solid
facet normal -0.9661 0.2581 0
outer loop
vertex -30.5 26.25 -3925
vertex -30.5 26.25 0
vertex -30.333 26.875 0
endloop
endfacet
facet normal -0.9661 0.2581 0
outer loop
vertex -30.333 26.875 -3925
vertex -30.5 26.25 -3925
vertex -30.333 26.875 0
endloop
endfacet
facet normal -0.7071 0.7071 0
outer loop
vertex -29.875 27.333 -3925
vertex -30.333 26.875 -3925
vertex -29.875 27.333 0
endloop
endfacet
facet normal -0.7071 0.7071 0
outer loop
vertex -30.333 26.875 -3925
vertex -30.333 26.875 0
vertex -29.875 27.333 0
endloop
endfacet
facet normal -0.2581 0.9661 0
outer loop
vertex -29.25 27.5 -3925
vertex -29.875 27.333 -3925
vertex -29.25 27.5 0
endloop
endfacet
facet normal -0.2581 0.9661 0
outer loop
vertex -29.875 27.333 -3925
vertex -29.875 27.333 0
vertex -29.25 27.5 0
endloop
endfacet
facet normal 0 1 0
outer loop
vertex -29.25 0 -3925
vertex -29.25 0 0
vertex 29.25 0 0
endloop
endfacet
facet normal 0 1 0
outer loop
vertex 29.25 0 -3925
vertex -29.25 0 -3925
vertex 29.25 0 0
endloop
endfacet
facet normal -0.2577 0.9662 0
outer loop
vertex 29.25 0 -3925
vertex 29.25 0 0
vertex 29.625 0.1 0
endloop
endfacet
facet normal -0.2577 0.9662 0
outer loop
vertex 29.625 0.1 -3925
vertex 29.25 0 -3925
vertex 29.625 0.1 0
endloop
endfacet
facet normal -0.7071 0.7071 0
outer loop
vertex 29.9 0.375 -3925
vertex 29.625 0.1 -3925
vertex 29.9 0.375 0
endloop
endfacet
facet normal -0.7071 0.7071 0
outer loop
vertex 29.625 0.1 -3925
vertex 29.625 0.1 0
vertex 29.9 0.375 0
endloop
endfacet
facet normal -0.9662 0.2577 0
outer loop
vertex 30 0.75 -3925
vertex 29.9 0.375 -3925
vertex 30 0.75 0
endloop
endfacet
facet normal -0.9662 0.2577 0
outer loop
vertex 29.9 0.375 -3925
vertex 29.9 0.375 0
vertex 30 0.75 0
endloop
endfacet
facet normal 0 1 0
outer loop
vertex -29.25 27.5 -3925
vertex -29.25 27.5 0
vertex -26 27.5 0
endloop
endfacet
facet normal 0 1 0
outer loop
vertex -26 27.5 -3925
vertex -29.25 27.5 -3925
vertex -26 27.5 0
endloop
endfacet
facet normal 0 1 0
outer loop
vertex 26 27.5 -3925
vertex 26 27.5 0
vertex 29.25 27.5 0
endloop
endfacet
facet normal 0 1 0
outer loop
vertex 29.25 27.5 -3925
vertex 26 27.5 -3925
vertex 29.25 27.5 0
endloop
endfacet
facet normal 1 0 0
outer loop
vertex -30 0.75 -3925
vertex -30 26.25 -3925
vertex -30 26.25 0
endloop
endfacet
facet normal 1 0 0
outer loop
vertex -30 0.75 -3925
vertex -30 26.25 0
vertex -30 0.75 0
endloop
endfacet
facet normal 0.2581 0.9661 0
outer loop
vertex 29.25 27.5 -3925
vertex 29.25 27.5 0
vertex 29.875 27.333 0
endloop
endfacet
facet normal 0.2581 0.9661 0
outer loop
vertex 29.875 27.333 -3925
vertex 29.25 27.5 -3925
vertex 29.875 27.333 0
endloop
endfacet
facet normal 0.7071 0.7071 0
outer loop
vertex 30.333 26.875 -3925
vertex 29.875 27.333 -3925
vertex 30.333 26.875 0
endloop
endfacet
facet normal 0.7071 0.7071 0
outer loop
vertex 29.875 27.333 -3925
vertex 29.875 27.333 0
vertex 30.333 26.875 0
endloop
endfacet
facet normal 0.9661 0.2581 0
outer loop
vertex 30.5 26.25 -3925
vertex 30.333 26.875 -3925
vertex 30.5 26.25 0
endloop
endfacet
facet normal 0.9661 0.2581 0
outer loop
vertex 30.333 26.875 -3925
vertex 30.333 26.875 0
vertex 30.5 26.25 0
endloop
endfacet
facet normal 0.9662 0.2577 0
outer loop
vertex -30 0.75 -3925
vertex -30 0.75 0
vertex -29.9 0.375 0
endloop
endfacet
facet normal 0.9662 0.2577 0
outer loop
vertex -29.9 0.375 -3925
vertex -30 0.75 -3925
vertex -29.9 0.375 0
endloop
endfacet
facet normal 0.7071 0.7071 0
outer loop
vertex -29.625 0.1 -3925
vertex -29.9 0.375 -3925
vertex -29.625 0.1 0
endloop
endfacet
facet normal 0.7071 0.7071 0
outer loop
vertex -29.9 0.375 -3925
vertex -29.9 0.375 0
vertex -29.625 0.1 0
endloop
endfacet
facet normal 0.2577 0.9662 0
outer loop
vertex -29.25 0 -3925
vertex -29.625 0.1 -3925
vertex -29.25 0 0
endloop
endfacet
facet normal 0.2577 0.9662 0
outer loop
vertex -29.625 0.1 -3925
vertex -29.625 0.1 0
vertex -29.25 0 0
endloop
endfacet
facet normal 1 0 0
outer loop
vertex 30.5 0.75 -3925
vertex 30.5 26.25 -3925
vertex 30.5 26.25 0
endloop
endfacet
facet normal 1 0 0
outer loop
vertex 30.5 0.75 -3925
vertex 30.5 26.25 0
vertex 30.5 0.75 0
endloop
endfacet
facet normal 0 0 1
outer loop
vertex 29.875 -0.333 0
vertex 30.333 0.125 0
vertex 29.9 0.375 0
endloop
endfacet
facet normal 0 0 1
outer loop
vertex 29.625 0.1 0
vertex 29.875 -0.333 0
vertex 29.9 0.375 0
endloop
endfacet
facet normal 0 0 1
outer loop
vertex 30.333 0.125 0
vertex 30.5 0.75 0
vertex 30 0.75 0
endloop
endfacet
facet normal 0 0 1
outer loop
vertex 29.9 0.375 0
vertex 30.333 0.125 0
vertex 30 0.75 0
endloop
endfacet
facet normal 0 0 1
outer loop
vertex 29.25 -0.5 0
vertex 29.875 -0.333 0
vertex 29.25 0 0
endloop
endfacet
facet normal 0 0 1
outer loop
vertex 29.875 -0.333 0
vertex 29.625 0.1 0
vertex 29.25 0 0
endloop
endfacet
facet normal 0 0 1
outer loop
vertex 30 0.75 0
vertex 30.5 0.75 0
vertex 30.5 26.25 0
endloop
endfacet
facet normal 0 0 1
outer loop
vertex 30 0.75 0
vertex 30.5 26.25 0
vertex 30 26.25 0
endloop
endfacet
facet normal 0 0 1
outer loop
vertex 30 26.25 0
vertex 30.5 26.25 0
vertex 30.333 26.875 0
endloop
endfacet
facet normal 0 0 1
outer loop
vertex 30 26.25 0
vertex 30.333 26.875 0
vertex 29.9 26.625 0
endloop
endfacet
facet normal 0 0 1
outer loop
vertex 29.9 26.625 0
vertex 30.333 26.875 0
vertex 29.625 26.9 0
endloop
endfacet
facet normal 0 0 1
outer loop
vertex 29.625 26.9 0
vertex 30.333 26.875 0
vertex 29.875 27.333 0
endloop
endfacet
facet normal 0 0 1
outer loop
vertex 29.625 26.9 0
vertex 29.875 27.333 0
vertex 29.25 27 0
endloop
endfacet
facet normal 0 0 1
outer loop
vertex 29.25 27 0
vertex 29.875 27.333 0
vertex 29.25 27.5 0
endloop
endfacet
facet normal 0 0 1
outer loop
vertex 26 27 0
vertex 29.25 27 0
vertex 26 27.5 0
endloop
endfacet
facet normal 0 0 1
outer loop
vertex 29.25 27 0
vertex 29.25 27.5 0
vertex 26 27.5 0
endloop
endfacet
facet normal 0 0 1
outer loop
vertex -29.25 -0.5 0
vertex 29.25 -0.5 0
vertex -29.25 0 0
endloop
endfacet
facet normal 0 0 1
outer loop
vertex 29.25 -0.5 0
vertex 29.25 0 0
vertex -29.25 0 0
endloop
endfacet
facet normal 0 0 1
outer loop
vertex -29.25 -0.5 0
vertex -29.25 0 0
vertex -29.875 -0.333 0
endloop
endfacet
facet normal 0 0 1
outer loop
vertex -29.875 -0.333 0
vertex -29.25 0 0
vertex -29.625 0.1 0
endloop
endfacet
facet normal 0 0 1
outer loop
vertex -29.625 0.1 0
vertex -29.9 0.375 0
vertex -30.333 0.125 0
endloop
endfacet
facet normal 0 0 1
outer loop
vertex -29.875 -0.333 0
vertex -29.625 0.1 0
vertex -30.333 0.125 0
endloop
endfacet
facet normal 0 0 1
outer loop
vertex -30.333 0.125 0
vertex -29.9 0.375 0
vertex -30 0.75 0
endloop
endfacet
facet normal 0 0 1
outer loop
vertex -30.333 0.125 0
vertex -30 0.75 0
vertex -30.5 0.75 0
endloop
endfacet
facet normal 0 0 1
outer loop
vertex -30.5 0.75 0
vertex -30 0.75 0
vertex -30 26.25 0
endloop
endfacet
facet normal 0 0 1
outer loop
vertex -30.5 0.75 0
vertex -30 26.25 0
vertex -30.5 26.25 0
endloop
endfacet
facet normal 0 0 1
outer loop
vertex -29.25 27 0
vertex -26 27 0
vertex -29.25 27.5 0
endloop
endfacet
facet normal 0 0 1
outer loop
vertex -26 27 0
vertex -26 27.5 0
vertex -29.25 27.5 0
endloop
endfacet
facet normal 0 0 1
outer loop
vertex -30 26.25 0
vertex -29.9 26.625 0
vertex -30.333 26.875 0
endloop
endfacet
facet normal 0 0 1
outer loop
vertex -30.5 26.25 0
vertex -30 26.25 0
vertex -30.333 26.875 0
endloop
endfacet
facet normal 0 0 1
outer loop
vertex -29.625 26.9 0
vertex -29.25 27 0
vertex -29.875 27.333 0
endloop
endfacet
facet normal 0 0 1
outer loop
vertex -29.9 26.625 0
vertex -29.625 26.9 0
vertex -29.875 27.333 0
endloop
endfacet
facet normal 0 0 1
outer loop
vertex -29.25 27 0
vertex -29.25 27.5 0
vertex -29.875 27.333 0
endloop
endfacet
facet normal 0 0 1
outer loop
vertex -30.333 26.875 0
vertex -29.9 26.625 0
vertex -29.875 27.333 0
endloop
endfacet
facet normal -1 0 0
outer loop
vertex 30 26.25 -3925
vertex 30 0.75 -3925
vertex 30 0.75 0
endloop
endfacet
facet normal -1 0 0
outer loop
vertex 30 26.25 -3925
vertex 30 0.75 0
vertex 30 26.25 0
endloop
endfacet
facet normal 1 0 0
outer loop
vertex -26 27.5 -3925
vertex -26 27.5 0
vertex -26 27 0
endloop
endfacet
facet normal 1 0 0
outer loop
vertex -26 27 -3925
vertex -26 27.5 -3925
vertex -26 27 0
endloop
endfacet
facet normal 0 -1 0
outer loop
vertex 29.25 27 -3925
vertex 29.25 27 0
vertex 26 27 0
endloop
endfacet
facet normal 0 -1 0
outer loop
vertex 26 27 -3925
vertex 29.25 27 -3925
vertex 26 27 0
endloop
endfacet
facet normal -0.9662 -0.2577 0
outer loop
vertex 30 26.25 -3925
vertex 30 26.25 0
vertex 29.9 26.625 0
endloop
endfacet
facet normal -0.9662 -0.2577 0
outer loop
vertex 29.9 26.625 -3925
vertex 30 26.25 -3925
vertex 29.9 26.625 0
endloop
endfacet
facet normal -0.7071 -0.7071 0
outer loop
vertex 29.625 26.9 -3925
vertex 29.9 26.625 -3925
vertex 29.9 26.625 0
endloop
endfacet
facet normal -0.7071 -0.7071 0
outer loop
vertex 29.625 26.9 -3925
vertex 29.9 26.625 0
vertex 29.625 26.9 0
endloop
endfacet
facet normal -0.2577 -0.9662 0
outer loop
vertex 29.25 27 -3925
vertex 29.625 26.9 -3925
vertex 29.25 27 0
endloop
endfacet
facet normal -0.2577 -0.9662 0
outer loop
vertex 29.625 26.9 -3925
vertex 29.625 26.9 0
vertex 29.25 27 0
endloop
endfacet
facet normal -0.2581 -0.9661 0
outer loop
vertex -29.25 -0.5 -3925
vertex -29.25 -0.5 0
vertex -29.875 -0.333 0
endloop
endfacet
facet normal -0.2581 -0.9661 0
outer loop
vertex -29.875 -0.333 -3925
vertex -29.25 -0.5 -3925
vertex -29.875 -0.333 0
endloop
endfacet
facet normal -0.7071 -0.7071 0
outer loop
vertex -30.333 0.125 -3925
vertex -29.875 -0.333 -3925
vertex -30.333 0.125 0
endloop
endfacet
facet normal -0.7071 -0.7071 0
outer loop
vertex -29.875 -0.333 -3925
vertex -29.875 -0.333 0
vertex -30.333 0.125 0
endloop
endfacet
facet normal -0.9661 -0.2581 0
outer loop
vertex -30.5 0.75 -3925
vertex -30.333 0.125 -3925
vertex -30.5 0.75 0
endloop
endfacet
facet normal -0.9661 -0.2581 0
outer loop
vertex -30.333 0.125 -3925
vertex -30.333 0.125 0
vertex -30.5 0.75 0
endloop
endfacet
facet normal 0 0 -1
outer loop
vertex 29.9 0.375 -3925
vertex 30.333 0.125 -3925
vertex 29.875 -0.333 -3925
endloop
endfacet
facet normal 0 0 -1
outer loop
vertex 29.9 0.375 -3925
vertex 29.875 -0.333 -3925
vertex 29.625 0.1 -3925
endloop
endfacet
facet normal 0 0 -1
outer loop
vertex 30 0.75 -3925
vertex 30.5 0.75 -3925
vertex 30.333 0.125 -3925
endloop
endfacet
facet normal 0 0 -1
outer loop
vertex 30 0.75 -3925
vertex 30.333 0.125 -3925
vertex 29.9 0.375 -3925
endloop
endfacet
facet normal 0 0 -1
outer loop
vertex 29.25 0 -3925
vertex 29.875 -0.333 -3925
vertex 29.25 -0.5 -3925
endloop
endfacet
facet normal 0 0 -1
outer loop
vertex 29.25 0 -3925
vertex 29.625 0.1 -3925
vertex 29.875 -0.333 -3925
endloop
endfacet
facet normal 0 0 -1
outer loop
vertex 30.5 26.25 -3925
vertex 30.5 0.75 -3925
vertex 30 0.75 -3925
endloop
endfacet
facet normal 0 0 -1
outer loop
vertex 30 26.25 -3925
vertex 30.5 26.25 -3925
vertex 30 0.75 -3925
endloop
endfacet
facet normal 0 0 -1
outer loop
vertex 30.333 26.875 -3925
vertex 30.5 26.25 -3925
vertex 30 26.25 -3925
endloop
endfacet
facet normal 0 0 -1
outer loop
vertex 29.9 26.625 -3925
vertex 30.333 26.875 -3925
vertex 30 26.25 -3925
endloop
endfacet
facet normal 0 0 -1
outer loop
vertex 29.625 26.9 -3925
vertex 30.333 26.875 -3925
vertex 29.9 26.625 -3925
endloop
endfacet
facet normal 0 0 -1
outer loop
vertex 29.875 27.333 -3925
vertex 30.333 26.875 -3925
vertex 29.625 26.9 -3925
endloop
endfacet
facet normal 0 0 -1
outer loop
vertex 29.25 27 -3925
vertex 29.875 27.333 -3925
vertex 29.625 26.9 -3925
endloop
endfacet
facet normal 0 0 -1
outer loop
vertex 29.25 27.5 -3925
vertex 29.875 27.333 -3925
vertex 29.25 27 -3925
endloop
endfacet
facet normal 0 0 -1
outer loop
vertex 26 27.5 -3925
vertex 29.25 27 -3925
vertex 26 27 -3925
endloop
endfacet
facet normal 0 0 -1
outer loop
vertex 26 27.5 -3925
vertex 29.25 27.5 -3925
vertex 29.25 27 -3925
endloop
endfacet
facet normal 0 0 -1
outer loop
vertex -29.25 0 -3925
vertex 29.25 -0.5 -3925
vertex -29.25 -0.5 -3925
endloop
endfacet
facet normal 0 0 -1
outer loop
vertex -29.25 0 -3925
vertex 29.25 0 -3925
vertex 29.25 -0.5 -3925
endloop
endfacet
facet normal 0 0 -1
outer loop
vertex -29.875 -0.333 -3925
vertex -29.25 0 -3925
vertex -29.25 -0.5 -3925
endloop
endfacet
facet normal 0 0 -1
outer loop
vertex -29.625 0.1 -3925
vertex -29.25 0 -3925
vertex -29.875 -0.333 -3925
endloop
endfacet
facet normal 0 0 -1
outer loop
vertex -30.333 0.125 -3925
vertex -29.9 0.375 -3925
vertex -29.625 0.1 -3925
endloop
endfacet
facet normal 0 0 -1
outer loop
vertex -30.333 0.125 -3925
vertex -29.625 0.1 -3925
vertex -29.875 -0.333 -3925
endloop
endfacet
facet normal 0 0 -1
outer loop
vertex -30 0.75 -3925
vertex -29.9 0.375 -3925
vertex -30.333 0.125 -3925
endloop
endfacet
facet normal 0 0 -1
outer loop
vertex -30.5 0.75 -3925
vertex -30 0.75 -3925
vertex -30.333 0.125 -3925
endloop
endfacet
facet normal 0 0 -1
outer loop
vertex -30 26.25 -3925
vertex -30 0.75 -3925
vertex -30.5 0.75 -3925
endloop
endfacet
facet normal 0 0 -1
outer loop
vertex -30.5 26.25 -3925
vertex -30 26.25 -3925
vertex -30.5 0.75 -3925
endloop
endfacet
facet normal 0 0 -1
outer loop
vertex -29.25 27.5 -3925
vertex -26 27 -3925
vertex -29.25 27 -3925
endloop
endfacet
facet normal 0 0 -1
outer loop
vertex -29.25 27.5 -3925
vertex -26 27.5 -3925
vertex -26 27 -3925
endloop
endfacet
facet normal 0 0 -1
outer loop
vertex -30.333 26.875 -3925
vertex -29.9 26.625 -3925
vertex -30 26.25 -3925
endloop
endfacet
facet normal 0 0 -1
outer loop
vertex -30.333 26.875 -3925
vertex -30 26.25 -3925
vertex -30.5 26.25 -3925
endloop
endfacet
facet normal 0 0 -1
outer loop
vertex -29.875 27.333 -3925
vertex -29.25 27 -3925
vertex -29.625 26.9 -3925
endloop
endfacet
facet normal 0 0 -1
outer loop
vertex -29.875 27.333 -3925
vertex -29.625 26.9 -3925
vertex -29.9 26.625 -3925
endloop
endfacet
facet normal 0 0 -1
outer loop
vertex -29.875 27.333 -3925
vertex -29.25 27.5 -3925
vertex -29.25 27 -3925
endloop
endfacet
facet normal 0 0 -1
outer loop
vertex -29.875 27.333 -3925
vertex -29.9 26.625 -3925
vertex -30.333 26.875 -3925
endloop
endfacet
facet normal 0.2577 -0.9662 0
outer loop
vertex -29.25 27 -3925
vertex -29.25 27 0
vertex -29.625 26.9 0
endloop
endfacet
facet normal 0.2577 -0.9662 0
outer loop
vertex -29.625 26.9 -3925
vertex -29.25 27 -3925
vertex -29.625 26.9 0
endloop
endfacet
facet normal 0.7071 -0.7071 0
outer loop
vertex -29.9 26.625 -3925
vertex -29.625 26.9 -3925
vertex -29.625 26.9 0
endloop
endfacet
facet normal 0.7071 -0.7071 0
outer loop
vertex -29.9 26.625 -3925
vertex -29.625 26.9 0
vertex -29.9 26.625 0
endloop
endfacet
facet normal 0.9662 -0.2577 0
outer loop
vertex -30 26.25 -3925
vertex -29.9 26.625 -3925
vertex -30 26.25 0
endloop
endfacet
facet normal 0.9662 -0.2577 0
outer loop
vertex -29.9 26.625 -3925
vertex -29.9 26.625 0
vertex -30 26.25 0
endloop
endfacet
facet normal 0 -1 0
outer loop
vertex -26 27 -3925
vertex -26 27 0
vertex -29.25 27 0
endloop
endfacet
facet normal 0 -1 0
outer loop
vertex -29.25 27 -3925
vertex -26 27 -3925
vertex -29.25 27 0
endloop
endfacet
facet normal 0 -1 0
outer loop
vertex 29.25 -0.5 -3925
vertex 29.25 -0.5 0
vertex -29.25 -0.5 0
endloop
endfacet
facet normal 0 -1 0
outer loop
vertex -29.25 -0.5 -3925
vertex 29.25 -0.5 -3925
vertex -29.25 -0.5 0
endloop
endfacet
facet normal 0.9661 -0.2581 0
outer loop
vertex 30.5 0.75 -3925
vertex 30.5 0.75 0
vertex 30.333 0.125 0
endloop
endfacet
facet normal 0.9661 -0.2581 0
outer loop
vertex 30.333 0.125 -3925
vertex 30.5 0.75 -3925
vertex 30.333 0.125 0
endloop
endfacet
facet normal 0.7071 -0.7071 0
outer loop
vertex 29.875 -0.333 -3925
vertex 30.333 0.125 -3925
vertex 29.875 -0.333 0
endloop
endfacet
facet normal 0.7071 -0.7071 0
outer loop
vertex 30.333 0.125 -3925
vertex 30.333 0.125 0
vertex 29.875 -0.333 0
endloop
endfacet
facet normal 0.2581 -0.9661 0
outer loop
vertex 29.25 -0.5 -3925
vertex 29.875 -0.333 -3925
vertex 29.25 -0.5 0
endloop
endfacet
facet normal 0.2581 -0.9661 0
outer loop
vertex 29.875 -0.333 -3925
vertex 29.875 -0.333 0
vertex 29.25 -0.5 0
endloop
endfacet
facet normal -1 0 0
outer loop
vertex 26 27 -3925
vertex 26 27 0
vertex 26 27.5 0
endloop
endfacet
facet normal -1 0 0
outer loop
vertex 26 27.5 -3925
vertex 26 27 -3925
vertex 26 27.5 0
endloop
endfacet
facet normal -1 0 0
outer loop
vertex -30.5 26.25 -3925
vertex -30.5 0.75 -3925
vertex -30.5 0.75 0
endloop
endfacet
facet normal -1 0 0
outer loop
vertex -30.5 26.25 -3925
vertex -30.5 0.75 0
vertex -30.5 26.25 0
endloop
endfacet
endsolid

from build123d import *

# Parameters (mm, degrees)
SM_BASE_FLANGE_1_DEPTH = 3925


# Sheet-metal steps are written as plain solids
with BuildPart() as part:
    # Sketch 1 → Базовая кромка1 (new body)
    with BuildSketch(Plane.XY):
        with BuildLine():
            Line((-26, 27), (-29.25, 27))
            ThreePointArc((-29.25, 27), (-29.780330086, 26.780330086), (-30, 26.25))
            Line((-30, 26.25), (-30, 0.75))
            ThreePointArc((-30, 0.75), (-29.780330086, 0.219669914), (-29.25, 0))
            Line((-29.25, 0), (29.25, 0))
            ThreePointArc((29.25, 0), (29.780330086, 0.219669914), (30, 0.75))
            Line((30, 0.75), (30, 26.25))
            ThreePointArc((30, 26.25), (29.780330086, 26.780330086), (29.25, 27))
            Line((29.25, 27), (26, 27))
            Line((26, 27), (26, 27.5))
            Line((26, 27.5), (29.25, 27.5))
            ThreePointArc((29.25, 27.5), (30.133883476, 27.133883476), (30.5, 26.25))
            Line((30.5, 26.25), (30.5, 0.75))
            ThreePointArc((30.5, 0.75), (30.133883476, -0.133883476), (29.25, -0.5))
            Line((29.25, -0.5), (-29.25, -0.5))
            ThreePointArc((-29.25, -0.5), (-30.133883476, -0.133883476), (-30.5, 0.75))
            Line((-30.5, 0.75), (-30.5, 26.25))
            ThreePointArc((-30.5, 26.25), (-30.133883476, 27.133883476), (-29.25, 27.5))
            Line((-29.25, 27.5), (-26, 27.5))
            Line((-26, 27.5), (-26, 27))
        make_face()
    extrude(amount=-SM_BASE_FLANGE_1_DEPTH)


solid = part.part
